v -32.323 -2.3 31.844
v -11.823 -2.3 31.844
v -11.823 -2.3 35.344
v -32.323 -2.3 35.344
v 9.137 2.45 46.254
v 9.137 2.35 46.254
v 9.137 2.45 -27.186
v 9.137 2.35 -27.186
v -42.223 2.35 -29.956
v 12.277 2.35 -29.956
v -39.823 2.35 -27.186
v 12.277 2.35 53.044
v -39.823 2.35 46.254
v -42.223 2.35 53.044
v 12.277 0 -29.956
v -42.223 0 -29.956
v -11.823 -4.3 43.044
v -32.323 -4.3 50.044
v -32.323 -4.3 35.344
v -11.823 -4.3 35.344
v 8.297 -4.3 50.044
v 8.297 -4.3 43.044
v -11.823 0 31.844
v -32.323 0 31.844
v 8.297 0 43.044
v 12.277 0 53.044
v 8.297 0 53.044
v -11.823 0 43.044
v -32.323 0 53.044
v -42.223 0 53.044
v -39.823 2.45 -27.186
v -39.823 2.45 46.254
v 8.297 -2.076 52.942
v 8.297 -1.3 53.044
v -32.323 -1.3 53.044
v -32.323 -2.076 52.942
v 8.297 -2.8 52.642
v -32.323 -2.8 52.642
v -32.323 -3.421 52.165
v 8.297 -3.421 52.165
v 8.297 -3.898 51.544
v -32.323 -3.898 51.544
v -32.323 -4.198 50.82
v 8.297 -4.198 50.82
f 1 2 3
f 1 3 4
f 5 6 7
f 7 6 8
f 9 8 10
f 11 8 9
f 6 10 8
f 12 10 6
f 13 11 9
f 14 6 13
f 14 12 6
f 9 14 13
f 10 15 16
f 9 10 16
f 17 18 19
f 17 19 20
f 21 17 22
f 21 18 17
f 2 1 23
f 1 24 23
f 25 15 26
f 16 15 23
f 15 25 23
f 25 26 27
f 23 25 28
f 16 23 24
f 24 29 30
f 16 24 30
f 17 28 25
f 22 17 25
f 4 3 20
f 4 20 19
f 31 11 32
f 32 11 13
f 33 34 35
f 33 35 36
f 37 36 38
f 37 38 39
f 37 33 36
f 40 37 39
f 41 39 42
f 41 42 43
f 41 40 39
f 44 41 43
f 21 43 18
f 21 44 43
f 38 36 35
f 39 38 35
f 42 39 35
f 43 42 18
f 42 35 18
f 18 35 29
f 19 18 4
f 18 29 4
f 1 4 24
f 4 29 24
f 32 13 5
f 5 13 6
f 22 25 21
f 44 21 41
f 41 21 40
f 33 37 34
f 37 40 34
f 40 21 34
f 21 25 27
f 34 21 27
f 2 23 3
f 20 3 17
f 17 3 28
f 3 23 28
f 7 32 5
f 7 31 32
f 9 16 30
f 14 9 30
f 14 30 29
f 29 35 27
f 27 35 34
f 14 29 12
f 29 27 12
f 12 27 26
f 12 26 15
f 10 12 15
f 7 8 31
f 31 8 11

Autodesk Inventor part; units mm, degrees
ref_plane "YZ Plane" through (0, 0, 0) normal (1, 0, 0) x (0, 1, 0)
ref_plane "XZ Plane" through (0, 0, 0) normal (0, 1, 0) x (-1, 0, 0)
ref_plane "XY Plane" through (0, 0, 0) normal (0, 0, 1) x (1, 0, 0)
sketch "Sketch1" plane through (0, 0, 0) normal (0, 1, 0) x (-1, 0, 0)
  line L0 (42.2226, 53.0438) -> (-12.2774, 53.0438)
  line L1 (-12.2774, 53.0438) -> (-12.2774, -29.9562)
  line L2 (-12.2774, -29.9562) -> (42.2226, -29.9562)
  line L3 (42.2226, -29.9562) -> (42.2226, 53.0438)
  point P0 (0, 0)
  dimension "d0" = 54.5
  dimension "d1" = 83
extrude "Extrusion1" add sketch "Sketch1" along normal blind 2.35
sketch "Sketch2" plane through (0, 2.35, 0) normal (0, 1, 0) x (1, 0, 0)
  line L0 (-39.8226, -46.2538) -> (9.1374, -46.2538)
  line L1 (9.1374, -46.2538) -> (9.1374, 27.1862)
  line L2 (9.1374, 27.1862) -> (-39.8226, 27.1862)
  line L3 (-39.8226, 27.1862) -> (-39.8226, -46.2538)
  line L4 (12.2774, -53.0438) -> (12.2774, 29.9562) projected
  line L5 (12.2774, 29.9562) -> (-42.2226, 29.9562) projected
  line L6 (-42.2226, 29.9562) -> (-42.2226, -53.0438) projected
  line L7 (-42.2226, -53.0438) -> (12.2774, -53.0438) projected
  point P0 (0, 0)
  dimension "d4" = 48.96
  dimension "d5" = 73.44
  dimension "d6" = 2.77
  dimension "d7" = 2.4
extrude "Extrusion2" add sketch "Sketch2" along normal blind 0.1 contours L3 L2 L1 L0
sketch "Sketch3" plane through (0, 0, 0) normal (0, -1, 0) x (1, 0, 0)
  line L0 (12.2774, 53.0438) -> (12.2774, -29.9562) projected
  line L1 (-42.2226, 53.0438) -> (12.2774, 53.0438) projected
  line L2 (-42.2226, -29.9562) -> (-42.2226, 53.0438) projected
  line L3 (12.2774, -29.9562) -> (-42.2226, -29.9562) projected
  line L4 (-42.2226, 53.0438) -> (12.2774, 53.0438) projected
  line L5 (-32.3226, 53.0438) -> (-32.3226, 31.8438)
  line L6 (-32.3226, 31.8438) -> (-11.8226, 31.8438)
  line L7 (-11.8226, 31.8438) -> (-11.8226, 43.0438)
  line L8 (-11.8226, 43.0438) -> (8.2974, 43.0438)
  line L9 (8.2974, 43.0438) -> (8.2974, 53.0438)
  point P0 (0, 0)
  dimension "d11" = 9.9
  dimension "d12" = 21.2
  dimension "d13" = 3.98
  dimension "d14" = 20.5
  dimension "d15" = 10
extrude "Extrusion3" add sketch "Sketch3" along normal blind 4.3 contours L9 L8 L7 L6 L5 L1
fillet "Fillet2" radius 3 1 edges at (-12.0126, -4.3, 53.0438)
sketch "Sketch4" plane through (-11.8226, 0, 31.8438) normal (0, 0, -1) x (-1, 0, 0)
  line L0 (0, 0) -> (20.5, 0) projected
  line L1 (0, 0) -> (0, -4.3) projected
  line L2 (20.5, -4.3) -> (0, -4.3) projected
  line L3 (20.5, 0) -> (20.5, -4.3) projected
  line L4 (0, -2.3) -> (20.5, -2.3)
  line L5 (20.5, -1.3) -> (20.5, -4.3) projected
  point P0 (-11.8226, 0)
  point P1 (0, -2.3)
  dimension "d19" = 2
extrude "Extrusion4" cut sketch "Sketch4" against normal blind 3.5 contours L4 L3 L2 L1
properties part number "Display"
